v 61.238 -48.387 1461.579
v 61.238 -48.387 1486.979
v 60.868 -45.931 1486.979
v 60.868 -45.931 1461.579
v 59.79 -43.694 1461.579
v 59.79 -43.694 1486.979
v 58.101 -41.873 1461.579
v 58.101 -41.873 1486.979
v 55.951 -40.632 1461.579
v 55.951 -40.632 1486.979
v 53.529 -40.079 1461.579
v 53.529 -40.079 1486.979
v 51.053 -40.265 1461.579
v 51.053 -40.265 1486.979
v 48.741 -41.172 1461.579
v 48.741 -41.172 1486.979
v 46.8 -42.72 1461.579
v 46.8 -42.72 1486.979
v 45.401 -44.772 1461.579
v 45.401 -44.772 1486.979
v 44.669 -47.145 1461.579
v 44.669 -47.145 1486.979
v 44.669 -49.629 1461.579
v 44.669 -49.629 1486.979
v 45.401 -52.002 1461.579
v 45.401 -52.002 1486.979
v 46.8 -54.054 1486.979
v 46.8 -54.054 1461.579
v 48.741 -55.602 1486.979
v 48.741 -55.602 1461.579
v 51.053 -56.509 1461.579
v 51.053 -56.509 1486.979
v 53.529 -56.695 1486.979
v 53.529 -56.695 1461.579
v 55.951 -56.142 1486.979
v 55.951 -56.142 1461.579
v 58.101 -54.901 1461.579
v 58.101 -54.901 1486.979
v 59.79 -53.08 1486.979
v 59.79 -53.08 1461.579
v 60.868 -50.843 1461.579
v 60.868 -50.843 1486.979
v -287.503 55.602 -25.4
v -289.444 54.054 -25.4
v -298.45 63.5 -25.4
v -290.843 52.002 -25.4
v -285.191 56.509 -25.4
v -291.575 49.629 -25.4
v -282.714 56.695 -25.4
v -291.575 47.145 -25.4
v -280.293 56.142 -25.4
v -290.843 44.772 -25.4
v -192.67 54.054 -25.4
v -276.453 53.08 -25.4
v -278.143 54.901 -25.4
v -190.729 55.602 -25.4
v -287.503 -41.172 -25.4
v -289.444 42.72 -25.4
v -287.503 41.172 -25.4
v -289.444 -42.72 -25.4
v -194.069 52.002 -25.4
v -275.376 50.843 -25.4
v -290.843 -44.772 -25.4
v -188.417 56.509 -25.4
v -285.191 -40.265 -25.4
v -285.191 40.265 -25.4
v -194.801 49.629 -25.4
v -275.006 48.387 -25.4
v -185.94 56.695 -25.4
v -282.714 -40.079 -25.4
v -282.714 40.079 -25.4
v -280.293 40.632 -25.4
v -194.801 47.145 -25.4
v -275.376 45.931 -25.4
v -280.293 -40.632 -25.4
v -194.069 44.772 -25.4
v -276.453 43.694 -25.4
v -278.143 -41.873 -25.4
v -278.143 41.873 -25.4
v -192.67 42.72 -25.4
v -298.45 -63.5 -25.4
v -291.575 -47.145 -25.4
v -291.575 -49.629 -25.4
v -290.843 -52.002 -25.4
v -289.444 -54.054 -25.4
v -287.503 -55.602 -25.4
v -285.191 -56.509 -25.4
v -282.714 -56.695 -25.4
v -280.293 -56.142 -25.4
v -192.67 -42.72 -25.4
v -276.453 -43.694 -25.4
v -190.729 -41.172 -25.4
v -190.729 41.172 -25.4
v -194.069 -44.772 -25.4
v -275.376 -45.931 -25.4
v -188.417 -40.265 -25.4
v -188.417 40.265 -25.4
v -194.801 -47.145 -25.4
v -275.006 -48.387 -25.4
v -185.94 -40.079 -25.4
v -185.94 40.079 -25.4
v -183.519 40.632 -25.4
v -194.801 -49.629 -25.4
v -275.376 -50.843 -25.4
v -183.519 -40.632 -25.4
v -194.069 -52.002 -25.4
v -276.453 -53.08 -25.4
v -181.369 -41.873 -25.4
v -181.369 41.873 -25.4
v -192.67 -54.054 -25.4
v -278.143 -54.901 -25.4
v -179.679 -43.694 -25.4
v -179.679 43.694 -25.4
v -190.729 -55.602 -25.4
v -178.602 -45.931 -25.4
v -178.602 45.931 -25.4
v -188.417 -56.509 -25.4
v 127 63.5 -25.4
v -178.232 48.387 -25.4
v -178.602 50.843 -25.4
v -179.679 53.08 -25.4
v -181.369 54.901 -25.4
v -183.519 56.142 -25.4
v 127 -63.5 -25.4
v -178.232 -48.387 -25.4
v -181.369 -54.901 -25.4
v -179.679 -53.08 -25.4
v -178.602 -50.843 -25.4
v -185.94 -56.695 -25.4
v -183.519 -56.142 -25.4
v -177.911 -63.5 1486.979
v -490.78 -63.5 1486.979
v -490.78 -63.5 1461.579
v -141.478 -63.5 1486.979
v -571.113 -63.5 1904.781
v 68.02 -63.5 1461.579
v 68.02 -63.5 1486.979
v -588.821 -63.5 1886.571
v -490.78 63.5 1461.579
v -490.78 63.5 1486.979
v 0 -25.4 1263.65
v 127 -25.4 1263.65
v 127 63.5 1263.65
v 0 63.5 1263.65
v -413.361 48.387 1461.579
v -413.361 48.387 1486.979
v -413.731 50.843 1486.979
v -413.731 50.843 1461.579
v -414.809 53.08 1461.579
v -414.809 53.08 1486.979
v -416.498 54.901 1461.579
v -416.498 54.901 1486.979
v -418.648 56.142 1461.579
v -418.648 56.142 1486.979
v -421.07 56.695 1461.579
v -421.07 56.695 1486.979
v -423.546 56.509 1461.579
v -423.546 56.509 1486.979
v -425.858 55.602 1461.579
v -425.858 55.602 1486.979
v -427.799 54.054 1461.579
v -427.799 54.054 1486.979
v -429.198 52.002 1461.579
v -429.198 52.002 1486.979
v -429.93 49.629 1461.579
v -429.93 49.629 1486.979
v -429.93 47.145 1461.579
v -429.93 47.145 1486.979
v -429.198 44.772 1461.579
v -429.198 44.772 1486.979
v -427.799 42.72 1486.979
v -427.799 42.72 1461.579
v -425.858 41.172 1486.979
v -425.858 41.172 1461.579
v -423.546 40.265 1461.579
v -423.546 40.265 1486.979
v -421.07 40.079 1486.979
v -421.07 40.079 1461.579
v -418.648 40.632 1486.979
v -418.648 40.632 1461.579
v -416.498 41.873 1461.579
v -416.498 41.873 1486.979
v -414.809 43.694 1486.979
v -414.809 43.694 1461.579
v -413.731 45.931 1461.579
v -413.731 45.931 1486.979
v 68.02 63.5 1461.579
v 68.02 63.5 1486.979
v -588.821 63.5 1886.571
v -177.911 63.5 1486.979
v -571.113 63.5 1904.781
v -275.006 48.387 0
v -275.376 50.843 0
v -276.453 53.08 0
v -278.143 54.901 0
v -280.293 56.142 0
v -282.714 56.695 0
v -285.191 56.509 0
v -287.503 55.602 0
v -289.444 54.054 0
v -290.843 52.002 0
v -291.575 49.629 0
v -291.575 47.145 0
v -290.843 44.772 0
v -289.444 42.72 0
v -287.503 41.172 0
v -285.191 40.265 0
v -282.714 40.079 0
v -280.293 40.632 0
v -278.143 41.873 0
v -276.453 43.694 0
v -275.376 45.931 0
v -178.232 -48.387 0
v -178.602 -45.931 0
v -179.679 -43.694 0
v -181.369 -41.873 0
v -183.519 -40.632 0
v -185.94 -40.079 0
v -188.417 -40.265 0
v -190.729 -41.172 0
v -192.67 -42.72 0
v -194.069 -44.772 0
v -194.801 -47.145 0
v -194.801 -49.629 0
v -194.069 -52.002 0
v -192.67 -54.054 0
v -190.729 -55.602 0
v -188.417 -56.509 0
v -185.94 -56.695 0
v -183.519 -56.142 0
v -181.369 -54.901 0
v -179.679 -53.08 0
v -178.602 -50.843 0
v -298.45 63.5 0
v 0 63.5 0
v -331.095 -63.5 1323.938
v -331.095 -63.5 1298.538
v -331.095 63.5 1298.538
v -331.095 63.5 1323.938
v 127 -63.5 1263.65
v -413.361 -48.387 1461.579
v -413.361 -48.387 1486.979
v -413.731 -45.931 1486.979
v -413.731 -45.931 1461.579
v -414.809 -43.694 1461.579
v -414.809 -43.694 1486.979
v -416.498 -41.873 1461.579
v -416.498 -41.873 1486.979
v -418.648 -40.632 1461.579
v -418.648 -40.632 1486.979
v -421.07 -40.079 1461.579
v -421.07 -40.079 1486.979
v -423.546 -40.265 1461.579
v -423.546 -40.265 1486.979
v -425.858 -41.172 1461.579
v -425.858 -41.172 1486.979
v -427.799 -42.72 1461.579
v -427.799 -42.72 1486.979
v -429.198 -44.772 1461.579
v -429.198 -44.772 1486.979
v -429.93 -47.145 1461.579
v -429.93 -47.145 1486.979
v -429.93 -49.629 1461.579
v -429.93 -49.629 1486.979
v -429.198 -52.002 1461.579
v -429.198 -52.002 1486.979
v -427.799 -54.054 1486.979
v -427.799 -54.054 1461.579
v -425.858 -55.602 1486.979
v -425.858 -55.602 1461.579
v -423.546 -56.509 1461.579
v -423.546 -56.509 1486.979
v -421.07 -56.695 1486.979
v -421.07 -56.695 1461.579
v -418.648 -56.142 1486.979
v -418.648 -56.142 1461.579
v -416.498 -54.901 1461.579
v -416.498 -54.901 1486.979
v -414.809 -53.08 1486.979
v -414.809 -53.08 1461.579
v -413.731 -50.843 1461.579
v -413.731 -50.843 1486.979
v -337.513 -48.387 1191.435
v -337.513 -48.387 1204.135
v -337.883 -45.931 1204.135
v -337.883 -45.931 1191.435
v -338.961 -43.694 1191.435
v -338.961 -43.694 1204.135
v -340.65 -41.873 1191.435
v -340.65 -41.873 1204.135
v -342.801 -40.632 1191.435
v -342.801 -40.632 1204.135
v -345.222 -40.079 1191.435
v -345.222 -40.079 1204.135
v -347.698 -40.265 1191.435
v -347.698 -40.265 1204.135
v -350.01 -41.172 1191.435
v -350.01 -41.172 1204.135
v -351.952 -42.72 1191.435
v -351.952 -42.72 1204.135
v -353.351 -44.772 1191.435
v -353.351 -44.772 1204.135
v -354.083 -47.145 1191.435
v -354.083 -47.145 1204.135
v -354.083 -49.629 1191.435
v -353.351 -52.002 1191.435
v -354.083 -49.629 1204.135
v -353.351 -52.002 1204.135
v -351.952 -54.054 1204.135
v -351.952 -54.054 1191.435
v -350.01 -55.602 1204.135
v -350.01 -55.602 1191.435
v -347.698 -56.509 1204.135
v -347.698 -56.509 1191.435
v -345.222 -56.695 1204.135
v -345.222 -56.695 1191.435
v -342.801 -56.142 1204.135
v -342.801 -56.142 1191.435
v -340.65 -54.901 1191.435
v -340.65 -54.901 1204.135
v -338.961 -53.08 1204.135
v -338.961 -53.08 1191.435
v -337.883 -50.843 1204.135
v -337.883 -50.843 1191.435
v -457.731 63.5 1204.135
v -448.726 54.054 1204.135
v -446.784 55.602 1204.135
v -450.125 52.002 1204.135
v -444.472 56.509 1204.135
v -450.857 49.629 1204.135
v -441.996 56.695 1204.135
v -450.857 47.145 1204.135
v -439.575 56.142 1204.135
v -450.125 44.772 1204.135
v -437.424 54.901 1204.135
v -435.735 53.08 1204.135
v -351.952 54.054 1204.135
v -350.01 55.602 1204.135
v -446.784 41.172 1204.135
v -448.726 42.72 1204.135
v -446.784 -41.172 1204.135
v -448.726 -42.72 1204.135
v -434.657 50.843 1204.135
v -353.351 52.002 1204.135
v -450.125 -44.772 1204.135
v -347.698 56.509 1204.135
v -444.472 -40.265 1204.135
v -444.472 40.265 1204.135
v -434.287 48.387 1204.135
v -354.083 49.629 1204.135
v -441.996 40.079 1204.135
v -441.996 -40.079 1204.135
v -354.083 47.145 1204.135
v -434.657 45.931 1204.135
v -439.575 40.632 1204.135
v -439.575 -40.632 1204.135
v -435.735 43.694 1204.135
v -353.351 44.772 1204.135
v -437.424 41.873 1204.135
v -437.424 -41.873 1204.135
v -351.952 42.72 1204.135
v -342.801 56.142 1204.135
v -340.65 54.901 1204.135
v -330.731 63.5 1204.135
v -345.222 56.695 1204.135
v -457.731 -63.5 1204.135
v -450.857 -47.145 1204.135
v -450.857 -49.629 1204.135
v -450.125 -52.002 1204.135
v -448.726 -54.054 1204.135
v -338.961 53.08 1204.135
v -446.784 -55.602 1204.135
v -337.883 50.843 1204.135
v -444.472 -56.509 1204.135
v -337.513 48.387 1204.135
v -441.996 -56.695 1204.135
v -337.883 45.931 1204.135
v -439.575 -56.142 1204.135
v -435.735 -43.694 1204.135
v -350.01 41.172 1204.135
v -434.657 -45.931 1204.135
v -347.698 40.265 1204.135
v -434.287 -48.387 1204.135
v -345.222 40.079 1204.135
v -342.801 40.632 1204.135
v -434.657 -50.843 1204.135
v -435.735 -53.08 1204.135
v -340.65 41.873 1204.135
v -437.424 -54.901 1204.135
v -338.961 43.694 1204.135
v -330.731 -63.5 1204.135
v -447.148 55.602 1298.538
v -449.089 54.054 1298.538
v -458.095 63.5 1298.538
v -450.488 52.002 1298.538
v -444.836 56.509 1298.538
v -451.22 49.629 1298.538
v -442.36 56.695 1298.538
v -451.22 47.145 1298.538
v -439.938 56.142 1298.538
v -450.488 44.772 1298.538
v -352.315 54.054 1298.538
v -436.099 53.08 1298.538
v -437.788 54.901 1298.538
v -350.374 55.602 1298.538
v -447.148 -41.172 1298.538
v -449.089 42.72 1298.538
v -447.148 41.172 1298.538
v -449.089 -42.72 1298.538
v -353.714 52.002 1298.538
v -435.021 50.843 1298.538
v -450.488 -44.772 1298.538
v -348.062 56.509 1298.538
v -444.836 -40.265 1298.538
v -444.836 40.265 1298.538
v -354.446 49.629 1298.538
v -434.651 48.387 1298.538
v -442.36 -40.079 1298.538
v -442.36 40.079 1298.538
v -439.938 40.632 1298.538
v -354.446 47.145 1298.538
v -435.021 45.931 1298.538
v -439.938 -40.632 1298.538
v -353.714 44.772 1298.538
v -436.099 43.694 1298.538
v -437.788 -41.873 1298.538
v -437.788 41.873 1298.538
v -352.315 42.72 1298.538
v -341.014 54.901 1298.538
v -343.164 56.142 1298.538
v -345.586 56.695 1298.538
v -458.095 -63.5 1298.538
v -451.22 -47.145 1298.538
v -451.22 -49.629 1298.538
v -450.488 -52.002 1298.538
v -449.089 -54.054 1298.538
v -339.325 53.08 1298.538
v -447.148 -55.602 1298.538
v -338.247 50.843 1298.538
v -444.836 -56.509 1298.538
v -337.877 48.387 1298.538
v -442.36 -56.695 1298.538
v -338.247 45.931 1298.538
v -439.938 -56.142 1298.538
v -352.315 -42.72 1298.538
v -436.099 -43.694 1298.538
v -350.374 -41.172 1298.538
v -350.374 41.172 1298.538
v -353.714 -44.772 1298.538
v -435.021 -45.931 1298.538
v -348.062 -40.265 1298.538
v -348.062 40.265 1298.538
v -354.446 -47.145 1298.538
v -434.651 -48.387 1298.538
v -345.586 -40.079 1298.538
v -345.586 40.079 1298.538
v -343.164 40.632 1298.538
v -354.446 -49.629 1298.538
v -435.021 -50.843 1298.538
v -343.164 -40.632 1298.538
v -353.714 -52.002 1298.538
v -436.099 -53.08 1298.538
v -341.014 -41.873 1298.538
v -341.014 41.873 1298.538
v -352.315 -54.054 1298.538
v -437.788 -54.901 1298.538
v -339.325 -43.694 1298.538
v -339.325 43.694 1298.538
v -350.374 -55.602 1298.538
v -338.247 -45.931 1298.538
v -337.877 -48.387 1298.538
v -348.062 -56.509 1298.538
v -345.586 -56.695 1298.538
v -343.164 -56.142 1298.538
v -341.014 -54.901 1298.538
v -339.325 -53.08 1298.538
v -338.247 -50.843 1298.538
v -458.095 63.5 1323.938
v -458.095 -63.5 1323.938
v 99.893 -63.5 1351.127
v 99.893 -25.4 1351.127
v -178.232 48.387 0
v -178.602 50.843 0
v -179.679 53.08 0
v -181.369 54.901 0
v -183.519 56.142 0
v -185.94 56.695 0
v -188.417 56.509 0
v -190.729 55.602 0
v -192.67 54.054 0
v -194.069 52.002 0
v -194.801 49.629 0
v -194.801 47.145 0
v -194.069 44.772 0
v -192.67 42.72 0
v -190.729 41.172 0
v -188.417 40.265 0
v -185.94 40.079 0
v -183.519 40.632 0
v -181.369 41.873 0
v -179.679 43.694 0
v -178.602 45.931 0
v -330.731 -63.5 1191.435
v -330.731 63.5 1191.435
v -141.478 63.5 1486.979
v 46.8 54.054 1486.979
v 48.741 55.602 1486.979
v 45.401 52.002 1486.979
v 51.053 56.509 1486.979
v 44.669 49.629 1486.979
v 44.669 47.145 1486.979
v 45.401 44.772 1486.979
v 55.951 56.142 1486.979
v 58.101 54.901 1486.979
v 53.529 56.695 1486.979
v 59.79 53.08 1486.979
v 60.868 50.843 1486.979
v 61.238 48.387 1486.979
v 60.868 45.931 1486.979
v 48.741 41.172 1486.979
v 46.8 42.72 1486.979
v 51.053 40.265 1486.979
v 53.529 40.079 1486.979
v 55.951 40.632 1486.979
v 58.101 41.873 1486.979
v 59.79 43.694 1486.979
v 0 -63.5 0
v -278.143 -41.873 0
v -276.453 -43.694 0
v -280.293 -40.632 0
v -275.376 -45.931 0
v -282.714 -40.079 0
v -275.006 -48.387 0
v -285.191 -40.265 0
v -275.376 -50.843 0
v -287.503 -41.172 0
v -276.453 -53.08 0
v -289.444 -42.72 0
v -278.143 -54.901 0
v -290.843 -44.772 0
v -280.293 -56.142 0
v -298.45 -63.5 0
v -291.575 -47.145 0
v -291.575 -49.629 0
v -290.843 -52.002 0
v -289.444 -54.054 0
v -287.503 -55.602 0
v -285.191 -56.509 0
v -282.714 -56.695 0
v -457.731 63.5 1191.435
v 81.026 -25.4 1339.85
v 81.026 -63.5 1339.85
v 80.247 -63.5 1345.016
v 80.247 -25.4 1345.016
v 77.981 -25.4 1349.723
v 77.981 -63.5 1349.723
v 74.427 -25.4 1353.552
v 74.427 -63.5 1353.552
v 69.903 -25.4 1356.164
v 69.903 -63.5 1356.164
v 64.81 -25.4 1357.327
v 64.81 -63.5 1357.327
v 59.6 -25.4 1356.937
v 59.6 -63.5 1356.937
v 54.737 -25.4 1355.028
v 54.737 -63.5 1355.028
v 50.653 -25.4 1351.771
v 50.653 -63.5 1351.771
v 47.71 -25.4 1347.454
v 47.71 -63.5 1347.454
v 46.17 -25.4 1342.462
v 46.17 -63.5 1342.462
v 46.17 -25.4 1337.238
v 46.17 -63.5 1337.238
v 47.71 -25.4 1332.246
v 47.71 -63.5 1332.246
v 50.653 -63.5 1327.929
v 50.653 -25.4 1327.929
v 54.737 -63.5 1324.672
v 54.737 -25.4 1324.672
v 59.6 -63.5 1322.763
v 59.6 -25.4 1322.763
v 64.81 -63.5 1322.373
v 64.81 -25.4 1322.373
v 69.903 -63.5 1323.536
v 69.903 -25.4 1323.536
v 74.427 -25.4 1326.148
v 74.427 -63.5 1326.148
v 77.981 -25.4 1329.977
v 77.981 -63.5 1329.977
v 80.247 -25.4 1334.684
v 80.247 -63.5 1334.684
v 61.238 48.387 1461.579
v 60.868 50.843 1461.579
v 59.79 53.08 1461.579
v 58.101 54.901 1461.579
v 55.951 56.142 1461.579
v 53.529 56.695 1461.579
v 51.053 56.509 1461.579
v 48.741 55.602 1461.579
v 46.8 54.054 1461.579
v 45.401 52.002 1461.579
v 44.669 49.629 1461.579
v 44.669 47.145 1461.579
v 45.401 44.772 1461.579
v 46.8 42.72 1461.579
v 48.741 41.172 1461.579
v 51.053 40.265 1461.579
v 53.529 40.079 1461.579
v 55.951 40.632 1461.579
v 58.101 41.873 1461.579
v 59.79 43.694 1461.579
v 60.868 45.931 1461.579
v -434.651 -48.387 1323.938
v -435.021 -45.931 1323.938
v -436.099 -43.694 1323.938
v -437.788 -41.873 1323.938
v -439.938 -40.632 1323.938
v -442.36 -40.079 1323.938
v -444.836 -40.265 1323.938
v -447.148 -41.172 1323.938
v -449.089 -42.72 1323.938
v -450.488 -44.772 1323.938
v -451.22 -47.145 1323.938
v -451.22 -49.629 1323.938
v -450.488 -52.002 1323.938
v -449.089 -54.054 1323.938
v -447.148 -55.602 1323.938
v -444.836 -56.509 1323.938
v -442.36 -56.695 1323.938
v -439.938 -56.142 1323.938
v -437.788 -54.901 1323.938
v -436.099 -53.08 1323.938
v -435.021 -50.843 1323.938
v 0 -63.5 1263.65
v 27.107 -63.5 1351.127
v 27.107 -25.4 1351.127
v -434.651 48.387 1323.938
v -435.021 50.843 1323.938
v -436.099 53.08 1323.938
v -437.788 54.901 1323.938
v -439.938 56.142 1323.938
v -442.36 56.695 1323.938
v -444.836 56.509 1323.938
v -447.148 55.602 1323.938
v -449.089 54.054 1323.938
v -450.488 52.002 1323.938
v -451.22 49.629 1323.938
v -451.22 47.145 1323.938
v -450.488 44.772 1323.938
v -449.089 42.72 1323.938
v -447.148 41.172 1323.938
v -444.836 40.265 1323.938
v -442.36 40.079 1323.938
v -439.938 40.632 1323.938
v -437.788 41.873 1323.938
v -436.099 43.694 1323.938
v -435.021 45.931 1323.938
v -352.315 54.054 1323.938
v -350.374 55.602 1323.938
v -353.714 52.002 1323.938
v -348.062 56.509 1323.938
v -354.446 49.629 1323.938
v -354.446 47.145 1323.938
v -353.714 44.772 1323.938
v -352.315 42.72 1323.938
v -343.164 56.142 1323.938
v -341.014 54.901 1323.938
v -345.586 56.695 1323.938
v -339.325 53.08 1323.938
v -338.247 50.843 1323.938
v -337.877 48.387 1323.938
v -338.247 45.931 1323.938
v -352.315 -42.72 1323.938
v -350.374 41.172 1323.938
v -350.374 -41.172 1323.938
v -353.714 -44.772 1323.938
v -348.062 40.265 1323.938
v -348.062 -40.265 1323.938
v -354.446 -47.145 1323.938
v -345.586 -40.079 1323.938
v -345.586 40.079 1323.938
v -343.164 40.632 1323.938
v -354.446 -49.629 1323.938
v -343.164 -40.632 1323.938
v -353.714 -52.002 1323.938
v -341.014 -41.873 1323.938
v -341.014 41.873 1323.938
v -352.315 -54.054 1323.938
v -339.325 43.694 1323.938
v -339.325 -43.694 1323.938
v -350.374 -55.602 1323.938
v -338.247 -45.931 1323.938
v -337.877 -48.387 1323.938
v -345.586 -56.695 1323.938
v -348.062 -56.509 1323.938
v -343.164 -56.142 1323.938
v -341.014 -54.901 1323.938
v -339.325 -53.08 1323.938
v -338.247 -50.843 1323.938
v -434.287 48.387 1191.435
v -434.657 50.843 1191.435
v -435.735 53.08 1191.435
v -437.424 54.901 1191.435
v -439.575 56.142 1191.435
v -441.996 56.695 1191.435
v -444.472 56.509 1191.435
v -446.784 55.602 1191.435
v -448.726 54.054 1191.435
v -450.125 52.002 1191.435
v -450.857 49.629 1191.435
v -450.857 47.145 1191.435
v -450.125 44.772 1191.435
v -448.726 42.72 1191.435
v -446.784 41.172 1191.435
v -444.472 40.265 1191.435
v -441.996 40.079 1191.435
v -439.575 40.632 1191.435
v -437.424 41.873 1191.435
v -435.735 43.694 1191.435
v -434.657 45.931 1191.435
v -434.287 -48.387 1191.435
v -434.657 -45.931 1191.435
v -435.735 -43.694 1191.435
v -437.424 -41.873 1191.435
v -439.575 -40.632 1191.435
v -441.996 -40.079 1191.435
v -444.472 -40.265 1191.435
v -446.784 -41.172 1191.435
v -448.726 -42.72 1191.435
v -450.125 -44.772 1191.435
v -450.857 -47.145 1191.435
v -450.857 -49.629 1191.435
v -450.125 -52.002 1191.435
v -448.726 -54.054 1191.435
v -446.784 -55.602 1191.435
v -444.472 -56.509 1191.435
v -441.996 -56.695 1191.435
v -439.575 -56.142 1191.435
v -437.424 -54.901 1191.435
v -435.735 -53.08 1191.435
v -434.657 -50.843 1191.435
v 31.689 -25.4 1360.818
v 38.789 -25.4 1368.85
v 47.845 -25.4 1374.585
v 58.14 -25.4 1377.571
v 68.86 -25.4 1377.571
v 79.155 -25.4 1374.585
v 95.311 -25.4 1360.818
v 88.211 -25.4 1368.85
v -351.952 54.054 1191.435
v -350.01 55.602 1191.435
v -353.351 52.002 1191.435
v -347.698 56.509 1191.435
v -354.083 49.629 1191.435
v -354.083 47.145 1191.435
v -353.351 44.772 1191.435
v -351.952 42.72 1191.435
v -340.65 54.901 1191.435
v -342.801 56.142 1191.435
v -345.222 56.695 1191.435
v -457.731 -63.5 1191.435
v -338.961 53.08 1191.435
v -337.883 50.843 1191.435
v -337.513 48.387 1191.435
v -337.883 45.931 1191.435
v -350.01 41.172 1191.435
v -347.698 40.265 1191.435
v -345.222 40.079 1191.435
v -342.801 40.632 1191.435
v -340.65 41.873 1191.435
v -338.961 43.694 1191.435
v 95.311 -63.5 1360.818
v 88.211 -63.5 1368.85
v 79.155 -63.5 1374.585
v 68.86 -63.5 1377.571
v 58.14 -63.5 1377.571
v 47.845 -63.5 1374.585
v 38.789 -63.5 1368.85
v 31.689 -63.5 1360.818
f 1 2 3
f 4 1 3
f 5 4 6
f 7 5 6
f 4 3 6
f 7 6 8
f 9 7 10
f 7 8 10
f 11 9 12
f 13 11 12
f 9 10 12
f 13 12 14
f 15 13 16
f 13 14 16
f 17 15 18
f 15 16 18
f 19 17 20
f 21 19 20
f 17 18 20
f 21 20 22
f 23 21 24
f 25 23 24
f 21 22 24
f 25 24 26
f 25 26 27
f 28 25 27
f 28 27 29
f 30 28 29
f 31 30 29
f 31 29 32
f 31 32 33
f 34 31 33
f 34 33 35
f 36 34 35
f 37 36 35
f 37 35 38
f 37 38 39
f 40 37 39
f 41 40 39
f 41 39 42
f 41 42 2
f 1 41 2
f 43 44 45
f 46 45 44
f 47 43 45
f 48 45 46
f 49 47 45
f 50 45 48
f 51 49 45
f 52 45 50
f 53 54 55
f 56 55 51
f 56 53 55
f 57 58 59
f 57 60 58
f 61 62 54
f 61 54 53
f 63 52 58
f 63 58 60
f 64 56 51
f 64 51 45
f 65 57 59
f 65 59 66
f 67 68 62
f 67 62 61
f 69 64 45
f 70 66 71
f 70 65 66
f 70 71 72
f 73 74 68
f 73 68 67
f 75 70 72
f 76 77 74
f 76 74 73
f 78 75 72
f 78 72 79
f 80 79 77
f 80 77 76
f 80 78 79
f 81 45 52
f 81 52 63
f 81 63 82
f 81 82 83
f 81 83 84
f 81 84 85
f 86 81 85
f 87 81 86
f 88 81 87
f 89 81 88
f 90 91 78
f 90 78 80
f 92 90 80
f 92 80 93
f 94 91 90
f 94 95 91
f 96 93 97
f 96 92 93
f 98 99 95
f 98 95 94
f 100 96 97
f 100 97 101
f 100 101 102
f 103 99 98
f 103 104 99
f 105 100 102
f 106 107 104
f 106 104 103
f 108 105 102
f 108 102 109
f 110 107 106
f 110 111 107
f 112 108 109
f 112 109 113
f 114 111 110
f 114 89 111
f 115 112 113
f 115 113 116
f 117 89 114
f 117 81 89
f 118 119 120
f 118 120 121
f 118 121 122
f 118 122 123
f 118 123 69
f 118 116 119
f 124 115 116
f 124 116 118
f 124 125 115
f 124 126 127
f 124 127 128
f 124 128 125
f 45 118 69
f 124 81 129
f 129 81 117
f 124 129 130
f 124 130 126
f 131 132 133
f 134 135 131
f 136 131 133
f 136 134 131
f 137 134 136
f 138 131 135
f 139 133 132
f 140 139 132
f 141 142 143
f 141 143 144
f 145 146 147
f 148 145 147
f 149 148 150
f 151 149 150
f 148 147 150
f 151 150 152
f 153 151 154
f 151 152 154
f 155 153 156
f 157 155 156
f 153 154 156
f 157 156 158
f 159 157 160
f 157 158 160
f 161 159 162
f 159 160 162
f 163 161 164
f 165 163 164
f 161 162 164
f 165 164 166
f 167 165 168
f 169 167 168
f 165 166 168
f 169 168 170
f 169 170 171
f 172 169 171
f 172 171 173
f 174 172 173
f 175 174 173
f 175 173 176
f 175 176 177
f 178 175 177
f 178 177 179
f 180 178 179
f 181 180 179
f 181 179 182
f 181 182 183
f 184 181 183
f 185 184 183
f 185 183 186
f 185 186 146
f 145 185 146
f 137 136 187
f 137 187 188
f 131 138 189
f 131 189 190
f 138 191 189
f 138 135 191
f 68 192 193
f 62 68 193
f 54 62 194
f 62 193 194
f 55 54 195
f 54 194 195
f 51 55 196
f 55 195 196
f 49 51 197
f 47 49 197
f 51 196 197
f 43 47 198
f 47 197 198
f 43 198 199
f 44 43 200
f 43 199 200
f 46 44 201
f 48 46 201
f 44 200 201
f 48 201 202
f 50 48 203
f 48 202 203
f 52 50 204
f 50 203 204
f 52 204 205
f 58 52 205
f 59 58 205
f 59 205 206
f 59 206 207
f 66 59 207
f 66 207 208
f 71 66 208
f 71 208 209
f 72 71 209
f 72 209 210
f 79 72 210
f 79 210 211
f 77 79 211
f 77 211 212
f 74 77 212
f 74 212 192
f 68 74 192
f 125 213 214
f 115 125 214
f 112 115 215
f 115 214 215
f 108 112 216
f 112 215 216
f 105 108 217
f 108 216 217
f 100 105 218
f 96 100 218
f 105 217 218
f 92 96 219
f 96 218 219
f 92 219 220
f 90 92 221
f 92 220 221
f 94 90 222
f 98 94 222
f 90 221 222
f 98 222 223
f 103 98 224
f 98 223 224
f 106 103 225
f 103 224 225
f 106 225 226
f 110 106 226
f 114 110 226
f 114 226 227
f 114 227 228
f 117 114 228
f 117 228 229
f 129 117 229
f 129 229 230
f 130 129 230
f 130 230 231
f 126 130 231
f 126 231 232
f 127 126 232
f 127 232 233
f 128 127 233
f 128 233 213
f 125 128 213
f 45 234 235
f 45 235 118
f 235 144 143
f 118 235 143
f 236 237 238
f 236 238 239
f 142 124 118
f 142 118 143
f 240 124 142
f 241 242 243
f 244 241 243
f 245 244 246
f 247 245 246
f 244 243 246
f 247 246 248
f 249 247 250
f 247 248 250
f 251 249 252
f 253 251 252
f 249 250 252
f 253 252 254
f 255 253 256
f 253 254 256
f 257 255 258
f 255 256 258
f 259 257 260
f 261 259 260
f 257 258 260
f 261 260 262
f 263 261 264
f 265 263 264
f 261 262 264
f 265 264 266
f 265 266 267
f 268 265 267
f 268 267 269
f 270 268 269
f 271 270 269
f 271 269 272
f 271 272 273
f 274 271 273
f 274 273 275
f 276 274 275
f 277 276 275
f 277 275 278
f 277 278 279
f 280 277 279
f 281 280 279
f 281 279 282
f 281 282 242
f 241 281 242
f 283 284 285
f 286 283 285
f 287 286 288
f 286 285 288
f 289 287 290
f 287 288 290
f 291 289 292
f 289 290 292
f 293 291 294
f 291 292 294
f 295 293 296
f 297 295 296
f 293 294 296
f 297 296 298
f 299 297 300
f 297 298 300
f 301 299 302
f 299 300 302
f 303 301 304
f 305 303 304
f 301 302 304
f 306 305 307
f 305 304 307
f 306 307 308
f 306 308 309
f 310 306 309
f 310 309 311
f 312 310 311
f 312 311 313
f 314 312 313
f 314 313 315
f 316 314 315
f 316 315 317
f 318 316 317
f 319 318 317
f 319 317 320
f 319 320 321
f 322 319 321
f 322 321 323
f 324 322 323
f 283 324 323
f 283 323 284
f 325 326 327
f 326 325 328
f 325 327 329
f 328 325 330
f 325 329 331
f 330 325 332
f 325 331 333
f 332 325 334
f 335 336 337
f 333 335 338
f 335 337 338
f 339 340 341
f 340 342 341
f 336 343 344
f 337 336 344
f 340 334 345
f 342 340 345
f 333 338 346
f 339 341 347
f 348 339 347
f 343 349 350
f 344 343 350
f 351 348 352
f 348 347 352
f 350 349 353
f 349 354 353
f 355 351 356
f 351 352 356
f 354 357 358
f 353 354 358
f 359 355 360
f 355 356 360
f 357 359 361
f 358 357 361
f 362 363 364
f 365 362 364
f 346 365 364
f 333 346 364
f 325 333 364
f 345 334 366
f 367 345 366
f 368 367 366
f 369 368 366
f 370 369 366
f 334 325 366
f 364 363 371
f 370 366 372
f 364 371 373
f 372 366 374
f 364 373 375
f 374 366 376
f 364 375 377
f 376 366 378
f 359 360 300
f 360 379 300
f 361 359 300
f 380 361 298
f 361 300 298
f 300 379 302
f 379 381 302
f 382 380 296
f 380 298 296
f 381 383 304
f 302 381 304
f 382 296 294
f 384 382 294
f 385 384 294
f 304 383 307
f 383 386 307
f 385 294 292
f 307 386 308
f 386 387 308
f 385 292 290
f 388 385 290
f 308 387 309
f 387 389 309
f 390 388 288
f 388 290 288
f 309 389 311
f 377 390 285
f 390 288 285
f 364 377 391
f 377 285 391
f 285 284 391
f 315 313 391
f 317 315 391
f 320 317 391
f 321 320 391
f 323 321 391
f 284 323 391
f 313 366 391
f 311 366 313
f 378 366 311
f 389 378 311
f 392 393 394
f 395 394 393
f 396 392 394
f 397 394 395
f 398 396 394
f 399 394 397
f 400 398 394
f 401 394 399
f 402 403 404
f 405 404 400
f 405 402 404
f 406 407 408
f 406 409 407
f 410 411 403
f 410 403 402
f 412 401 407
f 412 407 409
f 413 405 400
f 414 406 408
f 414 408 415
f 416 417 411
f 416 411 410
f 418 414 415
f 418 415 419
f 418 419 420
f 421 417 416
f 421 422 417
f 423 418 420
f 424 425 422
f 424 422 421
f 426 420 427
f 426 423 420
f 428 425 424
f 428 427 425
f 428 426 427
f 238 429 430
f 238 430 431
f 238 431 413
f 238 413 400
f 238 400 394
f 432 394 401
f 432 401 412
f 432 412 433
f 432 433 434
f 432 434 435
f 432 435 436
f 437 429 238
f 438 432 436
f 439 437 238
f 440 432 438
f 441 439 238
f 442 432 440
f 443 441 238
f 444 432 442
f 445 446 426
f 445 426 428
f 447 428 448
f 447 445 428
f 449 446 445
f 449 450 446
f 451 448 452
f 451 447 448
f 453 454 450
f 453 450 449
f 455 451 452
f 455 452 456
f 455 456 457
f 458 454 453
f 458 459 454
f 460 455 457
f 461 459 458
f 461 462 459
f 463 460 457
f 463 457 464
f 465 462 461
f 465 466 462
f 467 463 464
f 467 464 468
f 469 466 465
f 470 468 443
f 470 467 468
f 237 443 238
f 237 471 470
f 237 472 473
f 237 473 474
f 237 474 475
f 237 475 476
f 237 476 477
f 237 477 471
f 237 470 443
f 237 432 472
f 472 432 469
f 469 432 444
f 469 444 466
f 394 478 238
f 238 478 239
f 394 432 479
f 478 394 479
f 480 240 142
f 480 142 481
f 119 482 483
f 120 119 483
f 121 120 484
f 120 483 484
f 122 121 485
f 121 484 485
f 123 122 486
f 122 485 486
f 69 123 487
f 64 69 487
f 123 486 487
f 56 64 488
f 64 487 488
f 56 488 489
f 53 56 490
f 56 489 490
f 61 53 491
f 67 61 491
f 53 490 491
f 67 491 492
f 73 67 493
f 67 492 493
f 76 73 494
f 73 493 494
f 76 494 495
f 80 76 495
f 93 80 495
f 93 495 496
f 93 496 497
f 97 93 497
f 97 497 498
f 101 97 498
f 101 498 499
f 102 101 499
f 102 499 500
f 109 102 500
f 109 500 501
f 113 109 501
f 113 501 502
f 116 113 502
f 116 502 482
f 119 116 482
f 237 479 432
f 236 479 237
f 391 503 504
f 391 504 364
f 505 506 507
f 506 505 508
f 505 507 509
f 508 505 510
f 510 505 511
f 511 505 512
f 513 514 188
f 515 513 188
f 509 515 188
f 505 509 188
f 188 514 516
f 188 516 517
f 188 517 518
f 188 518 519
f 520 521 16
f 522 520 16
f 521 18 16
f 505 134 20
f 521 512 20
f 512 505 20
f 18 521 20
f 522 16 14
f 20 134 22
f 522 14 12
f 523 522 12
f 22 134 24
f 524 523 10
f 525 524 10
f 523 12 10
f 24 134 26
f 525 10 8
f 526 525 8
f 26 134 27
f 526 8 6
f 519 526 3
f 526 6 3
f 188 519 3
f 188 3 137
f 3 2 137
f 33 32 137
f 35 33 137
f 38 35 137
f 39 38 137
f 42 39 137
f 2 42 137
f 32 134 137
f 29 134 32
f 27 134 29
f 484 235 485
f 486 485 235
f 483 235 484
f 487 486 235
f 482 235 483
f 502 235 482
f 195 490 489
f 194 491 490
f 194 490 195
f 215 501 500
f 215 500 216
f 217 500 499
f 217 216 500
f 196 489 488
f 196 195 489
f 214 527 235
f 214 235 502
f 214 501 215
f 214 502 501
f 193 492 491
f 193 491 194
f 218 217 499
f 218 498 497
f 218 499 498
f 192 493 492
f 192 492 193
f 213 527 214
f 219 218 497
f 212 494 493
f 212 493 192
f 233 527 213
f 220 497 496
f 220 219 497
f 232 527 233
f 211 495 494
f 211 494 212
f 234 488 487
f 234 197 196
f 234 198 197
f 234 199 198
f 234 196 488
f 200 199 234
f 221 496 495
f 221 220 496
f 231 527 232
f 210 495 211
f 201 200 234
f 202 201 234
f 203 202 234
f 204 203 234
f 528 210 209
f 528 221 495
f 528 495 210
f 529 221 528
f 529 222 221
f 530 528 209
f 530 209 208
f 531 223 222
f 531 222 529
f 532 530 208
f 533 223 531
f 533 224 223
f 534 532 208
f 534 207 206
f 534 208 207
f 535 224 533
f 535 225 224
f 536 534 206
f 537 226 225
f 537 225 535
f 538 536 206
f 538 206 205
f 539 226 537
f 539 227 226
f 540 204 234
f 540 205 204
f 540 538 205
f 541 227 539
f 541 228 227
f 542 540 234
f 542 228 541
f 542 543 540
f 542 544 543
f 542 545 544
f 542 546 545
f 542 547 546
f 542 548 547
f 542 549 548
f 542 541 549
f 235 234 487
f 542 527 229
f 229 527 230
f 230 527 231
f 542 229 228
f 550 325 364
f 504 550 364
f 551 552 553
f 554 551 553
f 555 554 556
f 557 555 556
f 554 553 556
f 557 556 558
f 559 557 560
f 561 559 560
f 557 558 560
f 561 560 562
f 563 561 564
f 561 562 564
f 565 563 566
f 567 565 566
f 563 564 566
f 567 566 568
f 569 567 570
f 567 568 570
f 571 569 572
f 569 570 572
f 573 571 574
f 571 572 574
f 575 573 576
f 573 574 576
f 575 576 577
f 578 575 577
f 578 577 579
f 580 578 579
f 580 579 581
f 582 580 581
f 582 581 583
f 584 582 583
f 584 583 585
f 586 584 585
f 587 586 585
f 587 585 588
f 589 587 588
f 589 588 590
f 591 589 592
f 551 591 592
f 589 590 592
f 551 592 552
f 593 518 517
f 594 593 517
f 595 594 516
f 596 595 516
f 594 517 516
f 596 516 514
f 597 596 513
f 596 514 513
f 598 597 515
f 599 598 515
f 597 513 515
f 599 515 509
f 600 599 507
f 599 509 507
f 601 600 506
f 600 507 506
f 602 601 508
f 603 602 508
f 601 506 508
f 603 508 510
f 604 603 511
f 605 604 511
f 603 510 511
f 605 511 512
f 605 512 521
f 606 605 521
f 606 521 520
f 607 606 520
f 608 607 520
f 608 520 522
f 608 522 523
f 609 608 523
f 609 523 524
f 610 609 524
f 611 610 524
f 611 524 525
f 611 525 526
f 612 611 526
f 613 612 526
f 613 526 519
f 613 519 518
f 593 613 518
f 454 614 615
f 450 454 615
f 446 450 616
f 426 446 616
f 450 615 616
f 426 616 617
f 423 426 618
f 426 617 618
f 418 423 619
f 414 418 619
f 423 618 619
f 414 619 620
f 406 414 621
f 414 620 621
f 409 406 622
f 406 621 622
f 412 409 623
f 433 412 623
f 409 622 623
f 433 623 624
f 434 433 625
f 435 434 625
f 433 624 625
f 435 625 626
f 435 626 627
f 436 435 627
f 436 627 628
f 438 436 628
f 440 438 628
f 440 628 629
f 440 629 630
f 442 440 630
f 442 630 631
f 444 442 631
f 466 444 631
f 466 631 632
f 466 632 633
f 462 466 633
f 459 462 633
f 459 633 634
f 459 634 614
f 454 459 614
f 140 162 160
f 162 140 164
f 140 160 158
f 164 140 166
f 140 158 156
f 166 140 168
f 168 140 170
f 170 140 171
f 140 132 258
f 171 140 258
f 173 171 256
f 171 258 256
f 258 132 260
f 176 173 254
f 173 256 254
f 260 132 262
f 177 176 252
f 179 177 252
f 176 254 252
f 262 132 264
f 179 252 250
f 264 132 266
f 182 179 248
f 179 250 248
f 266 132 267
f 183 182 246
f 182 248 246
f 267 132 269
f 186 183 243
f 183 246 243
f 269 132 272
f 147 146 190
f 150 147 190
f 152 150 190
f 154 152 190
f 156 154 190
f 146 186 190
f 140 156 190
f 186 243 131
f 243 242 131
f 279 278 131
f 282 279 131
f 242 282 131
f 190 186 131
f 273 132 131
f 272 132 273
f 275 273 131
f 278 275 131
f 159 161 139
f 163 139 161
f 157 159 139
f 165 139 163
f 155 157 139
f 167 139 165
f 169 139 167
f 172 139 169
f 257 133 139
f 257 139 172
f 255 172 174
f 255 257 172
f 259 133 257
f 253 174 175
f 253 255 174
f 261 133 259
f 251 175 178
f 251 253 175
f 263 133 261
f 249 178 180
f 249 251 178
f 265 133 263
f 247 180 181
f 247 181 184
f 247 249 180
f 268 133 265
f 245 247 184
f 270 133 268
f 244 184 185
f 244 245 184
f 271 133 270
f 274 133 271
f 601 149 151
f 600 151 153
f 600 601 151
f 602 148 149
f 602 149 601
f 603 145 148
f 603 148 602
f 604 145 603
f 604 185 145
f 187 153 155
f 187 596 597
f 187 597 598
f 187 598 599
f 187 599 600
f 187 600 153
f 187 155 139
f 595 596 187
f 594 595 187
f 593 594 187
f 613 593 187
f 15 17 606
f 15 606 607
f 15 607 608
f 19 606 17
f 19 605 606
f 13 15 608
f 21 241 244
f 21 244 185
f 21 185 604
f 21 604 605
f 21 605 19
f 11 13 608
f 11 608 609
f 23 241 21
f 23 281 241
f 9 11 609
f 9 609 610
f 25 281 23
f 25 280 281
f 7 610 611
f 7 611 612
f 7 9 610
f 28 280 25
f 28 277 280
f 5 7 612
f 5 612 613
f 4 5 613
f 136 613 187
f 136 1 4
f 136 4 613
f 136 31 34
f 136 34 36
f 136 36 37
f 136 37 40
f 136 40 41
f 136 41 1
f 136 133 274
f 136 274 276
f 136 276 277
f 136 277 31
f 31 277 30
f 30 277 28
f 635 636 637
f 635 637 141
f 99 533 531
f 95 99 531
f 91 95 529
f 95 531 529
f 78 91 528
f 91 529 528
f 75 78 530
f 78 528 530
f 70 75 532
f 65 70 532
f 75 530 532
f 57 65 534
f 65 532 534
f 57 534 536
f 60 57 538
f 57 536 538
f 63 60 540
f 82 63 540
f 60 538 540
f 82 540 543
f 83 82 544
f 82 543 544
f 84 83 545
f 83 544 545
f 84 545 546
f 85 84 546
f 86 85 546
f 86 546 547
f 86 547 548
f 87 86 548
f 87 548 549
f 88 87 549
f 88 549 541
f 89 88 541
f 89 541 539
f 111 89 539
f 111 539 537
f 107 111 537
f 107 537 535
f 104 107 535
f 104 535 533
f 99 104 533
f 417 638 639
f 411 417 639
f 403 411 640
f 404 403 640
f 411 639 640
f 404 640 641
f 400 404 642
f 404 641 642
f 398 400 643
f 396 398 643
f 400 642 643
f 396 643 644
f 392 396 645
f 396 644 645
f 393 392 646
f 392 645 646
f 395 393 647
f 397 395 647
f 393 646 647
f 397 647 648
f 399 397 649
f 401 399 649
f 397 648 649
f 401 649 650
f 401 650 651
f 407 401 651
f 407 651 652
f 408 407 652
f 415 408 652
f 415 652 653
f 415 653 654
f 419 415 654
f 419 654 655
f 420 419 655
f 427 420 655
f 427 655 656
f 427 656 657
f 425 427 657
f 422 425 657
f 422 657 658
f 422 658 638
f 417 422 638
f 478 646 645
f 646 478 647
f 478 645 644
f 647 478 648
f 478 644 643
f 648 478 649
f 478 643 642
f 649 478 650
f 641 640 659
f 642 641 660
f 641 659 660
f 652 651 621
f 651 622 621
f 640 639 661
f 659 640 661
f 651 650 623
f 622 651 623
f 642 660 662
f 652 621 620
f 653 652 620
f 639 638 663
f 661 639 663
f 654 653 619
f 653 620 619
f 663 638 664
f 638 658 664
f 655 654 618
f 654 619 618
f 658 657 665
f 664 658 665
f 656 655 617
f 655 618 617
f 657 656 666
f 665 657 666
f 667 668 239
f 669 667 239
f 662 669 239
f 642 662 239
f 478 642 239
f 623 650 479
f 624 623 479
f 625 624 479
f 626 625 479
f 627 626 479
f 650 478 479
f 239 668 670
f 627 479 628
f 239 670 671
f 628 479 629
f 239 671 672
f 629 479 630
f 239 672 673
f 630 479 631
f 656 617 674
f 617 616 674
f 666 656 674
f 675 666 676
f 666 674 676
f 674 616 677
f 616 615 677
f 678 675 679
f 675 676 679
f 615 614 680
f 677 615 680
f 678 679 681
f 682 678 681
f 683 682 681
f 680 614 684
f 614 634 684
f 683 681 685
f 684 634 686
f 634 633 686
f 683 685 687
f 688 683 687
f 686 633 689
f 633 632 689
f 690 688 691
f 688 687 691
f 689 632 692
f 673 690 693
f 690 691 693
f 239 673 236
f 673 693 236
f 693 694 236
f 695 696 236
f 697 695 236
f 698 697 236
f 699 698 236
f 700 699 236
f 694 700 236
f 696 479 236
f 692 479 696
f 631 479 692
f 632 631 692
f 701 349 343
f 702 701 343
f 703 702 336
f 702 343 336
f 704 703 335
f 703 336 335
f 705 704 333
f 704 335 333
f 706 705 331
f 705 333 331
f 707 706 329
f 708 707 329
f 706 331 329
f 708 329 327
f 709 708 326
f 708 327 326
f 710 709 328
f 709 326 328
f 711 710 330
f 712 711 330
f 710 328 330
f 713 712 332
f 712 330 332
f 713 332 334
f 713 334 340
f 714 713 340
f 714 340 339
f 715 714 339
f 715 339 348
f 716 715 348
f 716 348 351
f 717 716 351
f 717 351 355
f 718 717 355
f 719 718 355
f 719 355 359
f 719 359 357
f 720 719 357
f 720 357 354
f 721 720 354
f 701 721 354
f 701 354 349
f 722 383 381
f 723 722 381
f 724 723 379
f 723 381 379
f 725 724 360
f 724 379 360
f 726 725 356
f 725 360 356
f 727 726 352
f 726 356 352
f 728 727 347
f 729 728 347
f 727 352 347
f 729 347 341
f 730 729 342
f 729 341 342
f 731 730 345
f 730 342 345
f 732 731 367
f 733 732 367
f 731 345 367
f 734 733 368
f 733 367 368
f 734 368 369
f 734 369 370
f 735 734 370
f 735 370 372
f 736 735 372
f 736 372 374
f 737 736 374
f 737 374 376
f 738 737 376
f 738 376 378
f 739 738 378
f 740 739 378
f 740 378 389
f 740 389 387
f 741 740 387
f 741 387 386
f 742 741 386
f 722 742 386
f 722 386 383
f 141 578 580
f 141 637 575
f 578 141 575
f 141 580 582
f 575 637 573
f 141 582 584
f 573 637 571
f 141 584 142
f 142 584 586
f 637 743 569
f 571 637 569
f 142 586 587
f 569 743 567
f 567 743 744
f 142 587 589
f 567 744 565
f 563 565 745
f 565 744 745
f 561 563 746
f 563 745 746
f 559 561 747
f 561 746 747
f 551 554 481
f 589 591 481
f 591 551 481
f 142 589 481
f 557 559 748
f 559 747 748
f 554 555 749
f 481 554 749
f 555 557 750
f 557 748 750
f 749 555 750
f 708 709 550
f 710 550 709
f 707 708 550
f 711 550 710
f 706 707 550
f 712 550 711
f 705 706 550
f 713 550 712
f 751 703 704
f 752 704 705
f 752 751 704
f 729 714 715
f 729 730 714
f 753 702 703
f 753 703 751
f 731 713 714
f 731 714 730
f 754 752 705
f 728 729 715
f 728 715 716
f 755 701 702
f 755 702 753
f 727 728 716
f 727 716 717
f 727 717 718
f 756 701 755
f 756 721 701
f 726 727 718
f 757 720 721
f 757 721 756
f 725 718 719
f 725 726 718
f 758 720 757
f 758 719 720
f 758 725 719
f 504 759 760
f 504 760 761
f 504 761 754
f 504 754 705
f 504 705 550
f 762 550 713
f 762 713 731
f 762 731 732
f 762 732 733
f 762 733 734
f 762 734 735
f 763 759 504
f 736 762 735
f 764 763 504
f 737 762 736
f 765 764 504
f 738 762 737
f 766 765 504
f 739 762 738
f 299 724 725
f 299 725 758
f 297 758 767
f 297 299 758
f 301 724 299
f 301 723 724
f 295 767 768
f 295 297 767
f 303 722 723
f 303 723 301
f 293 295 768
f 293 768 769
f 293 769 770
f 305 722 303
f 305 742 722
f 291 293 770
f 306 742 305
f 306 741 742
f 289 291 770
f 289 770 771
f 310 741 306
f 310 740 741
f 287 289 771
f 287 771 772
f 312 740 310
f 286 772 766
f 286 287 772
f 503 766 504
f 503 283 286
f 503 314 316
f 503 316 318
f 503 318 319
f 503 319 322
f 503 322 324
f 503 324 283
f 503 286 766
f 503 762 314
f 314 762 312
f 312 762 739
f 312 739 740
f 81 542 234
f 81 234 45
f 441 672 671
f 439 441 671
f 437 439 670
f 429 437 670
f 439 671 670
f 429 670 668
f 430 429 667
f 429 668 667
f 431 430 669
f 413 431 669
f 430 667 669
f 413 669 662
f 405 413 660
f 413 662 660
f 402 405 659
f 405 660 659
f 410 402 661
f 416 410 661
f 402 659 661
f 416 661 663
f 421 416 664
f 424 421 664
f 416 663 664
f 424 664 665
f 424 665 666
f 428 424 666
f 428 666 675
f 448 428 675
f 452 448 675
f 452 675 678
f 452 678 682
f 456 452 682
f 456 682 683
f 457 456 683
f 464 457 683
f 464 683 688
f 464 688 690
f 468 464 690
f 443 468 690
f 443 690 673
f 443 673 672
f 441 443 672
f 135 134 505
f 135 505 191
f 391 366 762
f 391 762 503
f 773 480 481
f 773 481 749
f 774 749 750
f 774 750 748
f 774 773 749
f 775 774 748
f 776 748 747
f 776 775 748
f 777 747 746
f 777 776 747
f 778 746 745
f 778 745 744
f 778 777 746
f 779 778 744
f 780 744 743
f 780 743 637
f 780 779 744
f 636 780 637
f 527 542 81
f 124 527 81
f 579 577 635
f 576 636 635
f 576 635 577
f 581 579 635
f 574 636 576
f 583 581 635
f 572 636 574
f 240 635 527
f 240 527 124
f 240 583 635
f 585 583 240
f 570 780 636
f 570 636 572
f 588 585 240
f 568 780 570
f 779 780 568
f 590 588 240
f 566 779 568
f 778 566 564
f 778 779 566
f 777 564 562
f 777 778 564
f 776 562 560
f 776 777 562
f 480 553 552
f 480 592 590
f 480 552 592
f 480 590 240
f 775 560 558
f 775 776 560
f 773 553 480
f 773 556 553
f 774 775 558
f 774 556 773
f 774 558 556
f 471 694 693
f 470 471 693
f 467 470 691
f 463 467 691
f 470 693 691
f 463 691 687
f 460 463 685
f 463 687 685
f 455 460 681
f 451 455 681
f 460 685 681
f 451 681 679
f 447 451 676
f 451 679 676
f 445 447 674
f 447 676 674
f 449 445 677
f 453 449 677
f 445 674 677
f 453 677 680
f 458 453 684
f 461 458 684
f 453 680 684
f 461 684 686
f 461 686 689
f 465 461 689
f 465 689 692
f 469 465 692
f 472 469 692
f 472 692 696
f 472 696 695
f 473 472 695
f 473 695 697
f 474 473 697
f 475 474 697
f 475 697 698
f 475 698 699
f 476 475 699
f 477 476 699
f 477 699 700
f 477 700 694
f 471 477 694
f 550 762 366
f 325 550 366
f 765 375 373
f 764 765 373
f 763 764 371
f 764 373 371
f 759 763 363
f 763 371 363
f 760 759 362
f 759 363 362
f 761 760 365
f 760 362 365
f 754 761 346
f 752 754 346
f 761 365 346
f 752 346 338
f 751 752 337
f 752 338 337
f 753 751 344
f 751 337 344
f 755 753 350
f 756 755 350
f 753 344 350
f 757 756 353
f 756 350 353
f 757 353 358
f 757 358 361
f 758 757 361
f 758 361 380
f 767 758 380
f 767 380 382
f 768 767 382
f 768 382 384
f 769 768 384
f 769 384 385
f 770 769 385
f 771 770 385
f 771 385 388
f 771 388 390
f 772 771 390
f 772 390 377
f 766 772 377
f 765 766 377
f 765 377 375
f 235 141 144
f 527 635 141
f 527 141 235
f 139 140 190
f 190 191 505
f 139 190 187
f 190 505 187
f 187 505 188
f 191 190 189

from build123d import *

# Parameters (mm, degrees)
F1_DEPTH  = 63.5
F3_R      = 8.3312
F4_DEPTH  = 25.401
F5_R      = 17.526
F6_DEPTH  = 38.1
F7_W      = 558.8
F7_H      = 25.4
F8_DEPTH  = 63.5
F9_R      = 8.3312
F10_DEPTH = 1512.3801652679
F12_DEPTH = 63.5
F13_W     = 127
F13_H     = 25.4
F14_DEPTH = 63.5
F13_H_2   = 12.7
F15_R     = 8.3312
F16_DEPTH = 161.036
F17_R     = 8.3312
F18_DEPTH = 25.4


with BuildPart() as f1:
    # F0 (on Front) → F1 (new body, symmetric)
    with BuildSketch(Plane.XZ):
        Polygon((0, 0), (-298.45, 0), (-298.45, -25.4), (127, -25.4), (127, 1263.65), (0, 1263.65), align=None)
    extrude(amount=F1_DEPTH, both=True)

    # F3 (on face) → F4 (cut, through all)
    with BuildSketch(Plane.XY):
        with Locations((-283.337, -48.387)):
            Circle(F3_R)
        with Locations((-186.563, -48.387)):
            Circle(F3_R)
        with Locations((-186.563, 48.387)):
            Circle(F3_R)
        with Locations((-283.337, 48.387)):
            Circle(F3_R)
    extrude(amount=-F4_DEPTH, mode=Mode.SUBTRACT)

    # F5 (on face) → F6 (join)
    with BuildSketch(Plane.XZ.offset(63.5)):
        with BuildLine():
            Line((127, 1263.65), (99.8927548056, 1351.1272956713))
            ThreePointArc((99.8927548056, 1351.1272956713), (63.5, 1377.95), (27.1072451944, 1351.1272956713))
            Line((27.1072451944, 1351.1272956713), (0, 1263.65))
            Line((0, 1263.65), (127, 1263.65))
        make_face()
        with Locations((63.5, 1339.85)):
            Circle(F5_R, mode=Mode.SUBTRACT)
    extrude(amount=-F6_DEPTH)


with BuildPart() as f8:
    # F7 (on Front) → F8 (new body, symmetric)
    with BuildSketch(Plane.XZ):
        with Locations((-211.3800937393, 1474.2791652679)):
            Rectangle(F7_W, F7_H)
    extrude(amount=F8_DEPTH, both=True)

    # F9 (on face) → F10 (cut, through all)
    with BuildSketch(Plane.XY.offset(1486.9791652679)):
        with Locations((-421.6920937393, -48.387)):
            Circle(F9_R)
        with Locations((52.9069062607, -48.387)):
            Circle(F9_R)
        with Locations((52.9069062607, 48.387)):
            Circle(F9_R)
        with Locations((-421.6920937393, 48.387)):
            Circle(F9_R)
    extrude(amount=-F10_DEPTH, mode=Mode.SUBTRACT)

    # F11 (on Front) → F12 (join, symmetric)
    with BuildSketch(Plane.XZ):
        Polygon((-571.1126877134, 1904.7805414024), (-588.8206813259, 1886.5710119681), (-151.7919749022, 1461.5791652679), (-134.0839812896, 1479.7886947023), align=None)
    extrude(amount=F12_DEPTH, both=True)


with BuildPart() as f14:
    # F13 (on Front) → F14 (new body, symmetric)
    with BuildSketch(Plane.XZ):
        with Locations((-394.595220685, 1311.2375096946)):
            Rectangle(F13_W, F13_H)
    extrude(amount=F14_DEPTH, both=True)

    # F15 (on face) → F16 (cut)
    with BuildSketch(Plane.XY.offset(1323.9375096946)):
        with Locations((-442.982220685, -48.387)):
            Circle(F15_R)
        with Locations((-442.982220685, 48.387)):
            Circle(F15_R)
        with Locations((-346.208220685, -48.387)):
            Circle(F15_R)
        with Locations((-346.208220685, 48.387)):
            Circle(F15_R)
    extrude(amount=-F16_DEPTH, mode=Mode.SUBTRACT)


with BuildPart() as f14b:
    # F13 (on Front) → F14, piece 2 (new body, symmetric)
    with BuildSketch(Plane.XZ):
        with Locations((-394.2314853668, 1197.7847410202)):
            Rectangle(F13_W, F13_H_2)
    extrude(amount=F14_DEPTH, both=True)

    # F17 (on face) → F18 (cut)
    with BuildSketch(Plane.XY.offset(1204.1347410202)):
        with Locations((-442.6184853668, -48.387)):
            Circle(F17_R)
        with Locations((-442.6184853668, 48.387)):
            Circle(F17_R)
        with Locations((-345.8444853668, -48.387)):
            Circle(F17_R)
        with Locations((-345.8444853668, 48.387)):
            Circle(F17_R)
    extrude(amount=-F18_DEPTH, mode=Mode.SUBTRACT)


solid = Compound([f1.part, f8.part, f14.part, f14b.part])
